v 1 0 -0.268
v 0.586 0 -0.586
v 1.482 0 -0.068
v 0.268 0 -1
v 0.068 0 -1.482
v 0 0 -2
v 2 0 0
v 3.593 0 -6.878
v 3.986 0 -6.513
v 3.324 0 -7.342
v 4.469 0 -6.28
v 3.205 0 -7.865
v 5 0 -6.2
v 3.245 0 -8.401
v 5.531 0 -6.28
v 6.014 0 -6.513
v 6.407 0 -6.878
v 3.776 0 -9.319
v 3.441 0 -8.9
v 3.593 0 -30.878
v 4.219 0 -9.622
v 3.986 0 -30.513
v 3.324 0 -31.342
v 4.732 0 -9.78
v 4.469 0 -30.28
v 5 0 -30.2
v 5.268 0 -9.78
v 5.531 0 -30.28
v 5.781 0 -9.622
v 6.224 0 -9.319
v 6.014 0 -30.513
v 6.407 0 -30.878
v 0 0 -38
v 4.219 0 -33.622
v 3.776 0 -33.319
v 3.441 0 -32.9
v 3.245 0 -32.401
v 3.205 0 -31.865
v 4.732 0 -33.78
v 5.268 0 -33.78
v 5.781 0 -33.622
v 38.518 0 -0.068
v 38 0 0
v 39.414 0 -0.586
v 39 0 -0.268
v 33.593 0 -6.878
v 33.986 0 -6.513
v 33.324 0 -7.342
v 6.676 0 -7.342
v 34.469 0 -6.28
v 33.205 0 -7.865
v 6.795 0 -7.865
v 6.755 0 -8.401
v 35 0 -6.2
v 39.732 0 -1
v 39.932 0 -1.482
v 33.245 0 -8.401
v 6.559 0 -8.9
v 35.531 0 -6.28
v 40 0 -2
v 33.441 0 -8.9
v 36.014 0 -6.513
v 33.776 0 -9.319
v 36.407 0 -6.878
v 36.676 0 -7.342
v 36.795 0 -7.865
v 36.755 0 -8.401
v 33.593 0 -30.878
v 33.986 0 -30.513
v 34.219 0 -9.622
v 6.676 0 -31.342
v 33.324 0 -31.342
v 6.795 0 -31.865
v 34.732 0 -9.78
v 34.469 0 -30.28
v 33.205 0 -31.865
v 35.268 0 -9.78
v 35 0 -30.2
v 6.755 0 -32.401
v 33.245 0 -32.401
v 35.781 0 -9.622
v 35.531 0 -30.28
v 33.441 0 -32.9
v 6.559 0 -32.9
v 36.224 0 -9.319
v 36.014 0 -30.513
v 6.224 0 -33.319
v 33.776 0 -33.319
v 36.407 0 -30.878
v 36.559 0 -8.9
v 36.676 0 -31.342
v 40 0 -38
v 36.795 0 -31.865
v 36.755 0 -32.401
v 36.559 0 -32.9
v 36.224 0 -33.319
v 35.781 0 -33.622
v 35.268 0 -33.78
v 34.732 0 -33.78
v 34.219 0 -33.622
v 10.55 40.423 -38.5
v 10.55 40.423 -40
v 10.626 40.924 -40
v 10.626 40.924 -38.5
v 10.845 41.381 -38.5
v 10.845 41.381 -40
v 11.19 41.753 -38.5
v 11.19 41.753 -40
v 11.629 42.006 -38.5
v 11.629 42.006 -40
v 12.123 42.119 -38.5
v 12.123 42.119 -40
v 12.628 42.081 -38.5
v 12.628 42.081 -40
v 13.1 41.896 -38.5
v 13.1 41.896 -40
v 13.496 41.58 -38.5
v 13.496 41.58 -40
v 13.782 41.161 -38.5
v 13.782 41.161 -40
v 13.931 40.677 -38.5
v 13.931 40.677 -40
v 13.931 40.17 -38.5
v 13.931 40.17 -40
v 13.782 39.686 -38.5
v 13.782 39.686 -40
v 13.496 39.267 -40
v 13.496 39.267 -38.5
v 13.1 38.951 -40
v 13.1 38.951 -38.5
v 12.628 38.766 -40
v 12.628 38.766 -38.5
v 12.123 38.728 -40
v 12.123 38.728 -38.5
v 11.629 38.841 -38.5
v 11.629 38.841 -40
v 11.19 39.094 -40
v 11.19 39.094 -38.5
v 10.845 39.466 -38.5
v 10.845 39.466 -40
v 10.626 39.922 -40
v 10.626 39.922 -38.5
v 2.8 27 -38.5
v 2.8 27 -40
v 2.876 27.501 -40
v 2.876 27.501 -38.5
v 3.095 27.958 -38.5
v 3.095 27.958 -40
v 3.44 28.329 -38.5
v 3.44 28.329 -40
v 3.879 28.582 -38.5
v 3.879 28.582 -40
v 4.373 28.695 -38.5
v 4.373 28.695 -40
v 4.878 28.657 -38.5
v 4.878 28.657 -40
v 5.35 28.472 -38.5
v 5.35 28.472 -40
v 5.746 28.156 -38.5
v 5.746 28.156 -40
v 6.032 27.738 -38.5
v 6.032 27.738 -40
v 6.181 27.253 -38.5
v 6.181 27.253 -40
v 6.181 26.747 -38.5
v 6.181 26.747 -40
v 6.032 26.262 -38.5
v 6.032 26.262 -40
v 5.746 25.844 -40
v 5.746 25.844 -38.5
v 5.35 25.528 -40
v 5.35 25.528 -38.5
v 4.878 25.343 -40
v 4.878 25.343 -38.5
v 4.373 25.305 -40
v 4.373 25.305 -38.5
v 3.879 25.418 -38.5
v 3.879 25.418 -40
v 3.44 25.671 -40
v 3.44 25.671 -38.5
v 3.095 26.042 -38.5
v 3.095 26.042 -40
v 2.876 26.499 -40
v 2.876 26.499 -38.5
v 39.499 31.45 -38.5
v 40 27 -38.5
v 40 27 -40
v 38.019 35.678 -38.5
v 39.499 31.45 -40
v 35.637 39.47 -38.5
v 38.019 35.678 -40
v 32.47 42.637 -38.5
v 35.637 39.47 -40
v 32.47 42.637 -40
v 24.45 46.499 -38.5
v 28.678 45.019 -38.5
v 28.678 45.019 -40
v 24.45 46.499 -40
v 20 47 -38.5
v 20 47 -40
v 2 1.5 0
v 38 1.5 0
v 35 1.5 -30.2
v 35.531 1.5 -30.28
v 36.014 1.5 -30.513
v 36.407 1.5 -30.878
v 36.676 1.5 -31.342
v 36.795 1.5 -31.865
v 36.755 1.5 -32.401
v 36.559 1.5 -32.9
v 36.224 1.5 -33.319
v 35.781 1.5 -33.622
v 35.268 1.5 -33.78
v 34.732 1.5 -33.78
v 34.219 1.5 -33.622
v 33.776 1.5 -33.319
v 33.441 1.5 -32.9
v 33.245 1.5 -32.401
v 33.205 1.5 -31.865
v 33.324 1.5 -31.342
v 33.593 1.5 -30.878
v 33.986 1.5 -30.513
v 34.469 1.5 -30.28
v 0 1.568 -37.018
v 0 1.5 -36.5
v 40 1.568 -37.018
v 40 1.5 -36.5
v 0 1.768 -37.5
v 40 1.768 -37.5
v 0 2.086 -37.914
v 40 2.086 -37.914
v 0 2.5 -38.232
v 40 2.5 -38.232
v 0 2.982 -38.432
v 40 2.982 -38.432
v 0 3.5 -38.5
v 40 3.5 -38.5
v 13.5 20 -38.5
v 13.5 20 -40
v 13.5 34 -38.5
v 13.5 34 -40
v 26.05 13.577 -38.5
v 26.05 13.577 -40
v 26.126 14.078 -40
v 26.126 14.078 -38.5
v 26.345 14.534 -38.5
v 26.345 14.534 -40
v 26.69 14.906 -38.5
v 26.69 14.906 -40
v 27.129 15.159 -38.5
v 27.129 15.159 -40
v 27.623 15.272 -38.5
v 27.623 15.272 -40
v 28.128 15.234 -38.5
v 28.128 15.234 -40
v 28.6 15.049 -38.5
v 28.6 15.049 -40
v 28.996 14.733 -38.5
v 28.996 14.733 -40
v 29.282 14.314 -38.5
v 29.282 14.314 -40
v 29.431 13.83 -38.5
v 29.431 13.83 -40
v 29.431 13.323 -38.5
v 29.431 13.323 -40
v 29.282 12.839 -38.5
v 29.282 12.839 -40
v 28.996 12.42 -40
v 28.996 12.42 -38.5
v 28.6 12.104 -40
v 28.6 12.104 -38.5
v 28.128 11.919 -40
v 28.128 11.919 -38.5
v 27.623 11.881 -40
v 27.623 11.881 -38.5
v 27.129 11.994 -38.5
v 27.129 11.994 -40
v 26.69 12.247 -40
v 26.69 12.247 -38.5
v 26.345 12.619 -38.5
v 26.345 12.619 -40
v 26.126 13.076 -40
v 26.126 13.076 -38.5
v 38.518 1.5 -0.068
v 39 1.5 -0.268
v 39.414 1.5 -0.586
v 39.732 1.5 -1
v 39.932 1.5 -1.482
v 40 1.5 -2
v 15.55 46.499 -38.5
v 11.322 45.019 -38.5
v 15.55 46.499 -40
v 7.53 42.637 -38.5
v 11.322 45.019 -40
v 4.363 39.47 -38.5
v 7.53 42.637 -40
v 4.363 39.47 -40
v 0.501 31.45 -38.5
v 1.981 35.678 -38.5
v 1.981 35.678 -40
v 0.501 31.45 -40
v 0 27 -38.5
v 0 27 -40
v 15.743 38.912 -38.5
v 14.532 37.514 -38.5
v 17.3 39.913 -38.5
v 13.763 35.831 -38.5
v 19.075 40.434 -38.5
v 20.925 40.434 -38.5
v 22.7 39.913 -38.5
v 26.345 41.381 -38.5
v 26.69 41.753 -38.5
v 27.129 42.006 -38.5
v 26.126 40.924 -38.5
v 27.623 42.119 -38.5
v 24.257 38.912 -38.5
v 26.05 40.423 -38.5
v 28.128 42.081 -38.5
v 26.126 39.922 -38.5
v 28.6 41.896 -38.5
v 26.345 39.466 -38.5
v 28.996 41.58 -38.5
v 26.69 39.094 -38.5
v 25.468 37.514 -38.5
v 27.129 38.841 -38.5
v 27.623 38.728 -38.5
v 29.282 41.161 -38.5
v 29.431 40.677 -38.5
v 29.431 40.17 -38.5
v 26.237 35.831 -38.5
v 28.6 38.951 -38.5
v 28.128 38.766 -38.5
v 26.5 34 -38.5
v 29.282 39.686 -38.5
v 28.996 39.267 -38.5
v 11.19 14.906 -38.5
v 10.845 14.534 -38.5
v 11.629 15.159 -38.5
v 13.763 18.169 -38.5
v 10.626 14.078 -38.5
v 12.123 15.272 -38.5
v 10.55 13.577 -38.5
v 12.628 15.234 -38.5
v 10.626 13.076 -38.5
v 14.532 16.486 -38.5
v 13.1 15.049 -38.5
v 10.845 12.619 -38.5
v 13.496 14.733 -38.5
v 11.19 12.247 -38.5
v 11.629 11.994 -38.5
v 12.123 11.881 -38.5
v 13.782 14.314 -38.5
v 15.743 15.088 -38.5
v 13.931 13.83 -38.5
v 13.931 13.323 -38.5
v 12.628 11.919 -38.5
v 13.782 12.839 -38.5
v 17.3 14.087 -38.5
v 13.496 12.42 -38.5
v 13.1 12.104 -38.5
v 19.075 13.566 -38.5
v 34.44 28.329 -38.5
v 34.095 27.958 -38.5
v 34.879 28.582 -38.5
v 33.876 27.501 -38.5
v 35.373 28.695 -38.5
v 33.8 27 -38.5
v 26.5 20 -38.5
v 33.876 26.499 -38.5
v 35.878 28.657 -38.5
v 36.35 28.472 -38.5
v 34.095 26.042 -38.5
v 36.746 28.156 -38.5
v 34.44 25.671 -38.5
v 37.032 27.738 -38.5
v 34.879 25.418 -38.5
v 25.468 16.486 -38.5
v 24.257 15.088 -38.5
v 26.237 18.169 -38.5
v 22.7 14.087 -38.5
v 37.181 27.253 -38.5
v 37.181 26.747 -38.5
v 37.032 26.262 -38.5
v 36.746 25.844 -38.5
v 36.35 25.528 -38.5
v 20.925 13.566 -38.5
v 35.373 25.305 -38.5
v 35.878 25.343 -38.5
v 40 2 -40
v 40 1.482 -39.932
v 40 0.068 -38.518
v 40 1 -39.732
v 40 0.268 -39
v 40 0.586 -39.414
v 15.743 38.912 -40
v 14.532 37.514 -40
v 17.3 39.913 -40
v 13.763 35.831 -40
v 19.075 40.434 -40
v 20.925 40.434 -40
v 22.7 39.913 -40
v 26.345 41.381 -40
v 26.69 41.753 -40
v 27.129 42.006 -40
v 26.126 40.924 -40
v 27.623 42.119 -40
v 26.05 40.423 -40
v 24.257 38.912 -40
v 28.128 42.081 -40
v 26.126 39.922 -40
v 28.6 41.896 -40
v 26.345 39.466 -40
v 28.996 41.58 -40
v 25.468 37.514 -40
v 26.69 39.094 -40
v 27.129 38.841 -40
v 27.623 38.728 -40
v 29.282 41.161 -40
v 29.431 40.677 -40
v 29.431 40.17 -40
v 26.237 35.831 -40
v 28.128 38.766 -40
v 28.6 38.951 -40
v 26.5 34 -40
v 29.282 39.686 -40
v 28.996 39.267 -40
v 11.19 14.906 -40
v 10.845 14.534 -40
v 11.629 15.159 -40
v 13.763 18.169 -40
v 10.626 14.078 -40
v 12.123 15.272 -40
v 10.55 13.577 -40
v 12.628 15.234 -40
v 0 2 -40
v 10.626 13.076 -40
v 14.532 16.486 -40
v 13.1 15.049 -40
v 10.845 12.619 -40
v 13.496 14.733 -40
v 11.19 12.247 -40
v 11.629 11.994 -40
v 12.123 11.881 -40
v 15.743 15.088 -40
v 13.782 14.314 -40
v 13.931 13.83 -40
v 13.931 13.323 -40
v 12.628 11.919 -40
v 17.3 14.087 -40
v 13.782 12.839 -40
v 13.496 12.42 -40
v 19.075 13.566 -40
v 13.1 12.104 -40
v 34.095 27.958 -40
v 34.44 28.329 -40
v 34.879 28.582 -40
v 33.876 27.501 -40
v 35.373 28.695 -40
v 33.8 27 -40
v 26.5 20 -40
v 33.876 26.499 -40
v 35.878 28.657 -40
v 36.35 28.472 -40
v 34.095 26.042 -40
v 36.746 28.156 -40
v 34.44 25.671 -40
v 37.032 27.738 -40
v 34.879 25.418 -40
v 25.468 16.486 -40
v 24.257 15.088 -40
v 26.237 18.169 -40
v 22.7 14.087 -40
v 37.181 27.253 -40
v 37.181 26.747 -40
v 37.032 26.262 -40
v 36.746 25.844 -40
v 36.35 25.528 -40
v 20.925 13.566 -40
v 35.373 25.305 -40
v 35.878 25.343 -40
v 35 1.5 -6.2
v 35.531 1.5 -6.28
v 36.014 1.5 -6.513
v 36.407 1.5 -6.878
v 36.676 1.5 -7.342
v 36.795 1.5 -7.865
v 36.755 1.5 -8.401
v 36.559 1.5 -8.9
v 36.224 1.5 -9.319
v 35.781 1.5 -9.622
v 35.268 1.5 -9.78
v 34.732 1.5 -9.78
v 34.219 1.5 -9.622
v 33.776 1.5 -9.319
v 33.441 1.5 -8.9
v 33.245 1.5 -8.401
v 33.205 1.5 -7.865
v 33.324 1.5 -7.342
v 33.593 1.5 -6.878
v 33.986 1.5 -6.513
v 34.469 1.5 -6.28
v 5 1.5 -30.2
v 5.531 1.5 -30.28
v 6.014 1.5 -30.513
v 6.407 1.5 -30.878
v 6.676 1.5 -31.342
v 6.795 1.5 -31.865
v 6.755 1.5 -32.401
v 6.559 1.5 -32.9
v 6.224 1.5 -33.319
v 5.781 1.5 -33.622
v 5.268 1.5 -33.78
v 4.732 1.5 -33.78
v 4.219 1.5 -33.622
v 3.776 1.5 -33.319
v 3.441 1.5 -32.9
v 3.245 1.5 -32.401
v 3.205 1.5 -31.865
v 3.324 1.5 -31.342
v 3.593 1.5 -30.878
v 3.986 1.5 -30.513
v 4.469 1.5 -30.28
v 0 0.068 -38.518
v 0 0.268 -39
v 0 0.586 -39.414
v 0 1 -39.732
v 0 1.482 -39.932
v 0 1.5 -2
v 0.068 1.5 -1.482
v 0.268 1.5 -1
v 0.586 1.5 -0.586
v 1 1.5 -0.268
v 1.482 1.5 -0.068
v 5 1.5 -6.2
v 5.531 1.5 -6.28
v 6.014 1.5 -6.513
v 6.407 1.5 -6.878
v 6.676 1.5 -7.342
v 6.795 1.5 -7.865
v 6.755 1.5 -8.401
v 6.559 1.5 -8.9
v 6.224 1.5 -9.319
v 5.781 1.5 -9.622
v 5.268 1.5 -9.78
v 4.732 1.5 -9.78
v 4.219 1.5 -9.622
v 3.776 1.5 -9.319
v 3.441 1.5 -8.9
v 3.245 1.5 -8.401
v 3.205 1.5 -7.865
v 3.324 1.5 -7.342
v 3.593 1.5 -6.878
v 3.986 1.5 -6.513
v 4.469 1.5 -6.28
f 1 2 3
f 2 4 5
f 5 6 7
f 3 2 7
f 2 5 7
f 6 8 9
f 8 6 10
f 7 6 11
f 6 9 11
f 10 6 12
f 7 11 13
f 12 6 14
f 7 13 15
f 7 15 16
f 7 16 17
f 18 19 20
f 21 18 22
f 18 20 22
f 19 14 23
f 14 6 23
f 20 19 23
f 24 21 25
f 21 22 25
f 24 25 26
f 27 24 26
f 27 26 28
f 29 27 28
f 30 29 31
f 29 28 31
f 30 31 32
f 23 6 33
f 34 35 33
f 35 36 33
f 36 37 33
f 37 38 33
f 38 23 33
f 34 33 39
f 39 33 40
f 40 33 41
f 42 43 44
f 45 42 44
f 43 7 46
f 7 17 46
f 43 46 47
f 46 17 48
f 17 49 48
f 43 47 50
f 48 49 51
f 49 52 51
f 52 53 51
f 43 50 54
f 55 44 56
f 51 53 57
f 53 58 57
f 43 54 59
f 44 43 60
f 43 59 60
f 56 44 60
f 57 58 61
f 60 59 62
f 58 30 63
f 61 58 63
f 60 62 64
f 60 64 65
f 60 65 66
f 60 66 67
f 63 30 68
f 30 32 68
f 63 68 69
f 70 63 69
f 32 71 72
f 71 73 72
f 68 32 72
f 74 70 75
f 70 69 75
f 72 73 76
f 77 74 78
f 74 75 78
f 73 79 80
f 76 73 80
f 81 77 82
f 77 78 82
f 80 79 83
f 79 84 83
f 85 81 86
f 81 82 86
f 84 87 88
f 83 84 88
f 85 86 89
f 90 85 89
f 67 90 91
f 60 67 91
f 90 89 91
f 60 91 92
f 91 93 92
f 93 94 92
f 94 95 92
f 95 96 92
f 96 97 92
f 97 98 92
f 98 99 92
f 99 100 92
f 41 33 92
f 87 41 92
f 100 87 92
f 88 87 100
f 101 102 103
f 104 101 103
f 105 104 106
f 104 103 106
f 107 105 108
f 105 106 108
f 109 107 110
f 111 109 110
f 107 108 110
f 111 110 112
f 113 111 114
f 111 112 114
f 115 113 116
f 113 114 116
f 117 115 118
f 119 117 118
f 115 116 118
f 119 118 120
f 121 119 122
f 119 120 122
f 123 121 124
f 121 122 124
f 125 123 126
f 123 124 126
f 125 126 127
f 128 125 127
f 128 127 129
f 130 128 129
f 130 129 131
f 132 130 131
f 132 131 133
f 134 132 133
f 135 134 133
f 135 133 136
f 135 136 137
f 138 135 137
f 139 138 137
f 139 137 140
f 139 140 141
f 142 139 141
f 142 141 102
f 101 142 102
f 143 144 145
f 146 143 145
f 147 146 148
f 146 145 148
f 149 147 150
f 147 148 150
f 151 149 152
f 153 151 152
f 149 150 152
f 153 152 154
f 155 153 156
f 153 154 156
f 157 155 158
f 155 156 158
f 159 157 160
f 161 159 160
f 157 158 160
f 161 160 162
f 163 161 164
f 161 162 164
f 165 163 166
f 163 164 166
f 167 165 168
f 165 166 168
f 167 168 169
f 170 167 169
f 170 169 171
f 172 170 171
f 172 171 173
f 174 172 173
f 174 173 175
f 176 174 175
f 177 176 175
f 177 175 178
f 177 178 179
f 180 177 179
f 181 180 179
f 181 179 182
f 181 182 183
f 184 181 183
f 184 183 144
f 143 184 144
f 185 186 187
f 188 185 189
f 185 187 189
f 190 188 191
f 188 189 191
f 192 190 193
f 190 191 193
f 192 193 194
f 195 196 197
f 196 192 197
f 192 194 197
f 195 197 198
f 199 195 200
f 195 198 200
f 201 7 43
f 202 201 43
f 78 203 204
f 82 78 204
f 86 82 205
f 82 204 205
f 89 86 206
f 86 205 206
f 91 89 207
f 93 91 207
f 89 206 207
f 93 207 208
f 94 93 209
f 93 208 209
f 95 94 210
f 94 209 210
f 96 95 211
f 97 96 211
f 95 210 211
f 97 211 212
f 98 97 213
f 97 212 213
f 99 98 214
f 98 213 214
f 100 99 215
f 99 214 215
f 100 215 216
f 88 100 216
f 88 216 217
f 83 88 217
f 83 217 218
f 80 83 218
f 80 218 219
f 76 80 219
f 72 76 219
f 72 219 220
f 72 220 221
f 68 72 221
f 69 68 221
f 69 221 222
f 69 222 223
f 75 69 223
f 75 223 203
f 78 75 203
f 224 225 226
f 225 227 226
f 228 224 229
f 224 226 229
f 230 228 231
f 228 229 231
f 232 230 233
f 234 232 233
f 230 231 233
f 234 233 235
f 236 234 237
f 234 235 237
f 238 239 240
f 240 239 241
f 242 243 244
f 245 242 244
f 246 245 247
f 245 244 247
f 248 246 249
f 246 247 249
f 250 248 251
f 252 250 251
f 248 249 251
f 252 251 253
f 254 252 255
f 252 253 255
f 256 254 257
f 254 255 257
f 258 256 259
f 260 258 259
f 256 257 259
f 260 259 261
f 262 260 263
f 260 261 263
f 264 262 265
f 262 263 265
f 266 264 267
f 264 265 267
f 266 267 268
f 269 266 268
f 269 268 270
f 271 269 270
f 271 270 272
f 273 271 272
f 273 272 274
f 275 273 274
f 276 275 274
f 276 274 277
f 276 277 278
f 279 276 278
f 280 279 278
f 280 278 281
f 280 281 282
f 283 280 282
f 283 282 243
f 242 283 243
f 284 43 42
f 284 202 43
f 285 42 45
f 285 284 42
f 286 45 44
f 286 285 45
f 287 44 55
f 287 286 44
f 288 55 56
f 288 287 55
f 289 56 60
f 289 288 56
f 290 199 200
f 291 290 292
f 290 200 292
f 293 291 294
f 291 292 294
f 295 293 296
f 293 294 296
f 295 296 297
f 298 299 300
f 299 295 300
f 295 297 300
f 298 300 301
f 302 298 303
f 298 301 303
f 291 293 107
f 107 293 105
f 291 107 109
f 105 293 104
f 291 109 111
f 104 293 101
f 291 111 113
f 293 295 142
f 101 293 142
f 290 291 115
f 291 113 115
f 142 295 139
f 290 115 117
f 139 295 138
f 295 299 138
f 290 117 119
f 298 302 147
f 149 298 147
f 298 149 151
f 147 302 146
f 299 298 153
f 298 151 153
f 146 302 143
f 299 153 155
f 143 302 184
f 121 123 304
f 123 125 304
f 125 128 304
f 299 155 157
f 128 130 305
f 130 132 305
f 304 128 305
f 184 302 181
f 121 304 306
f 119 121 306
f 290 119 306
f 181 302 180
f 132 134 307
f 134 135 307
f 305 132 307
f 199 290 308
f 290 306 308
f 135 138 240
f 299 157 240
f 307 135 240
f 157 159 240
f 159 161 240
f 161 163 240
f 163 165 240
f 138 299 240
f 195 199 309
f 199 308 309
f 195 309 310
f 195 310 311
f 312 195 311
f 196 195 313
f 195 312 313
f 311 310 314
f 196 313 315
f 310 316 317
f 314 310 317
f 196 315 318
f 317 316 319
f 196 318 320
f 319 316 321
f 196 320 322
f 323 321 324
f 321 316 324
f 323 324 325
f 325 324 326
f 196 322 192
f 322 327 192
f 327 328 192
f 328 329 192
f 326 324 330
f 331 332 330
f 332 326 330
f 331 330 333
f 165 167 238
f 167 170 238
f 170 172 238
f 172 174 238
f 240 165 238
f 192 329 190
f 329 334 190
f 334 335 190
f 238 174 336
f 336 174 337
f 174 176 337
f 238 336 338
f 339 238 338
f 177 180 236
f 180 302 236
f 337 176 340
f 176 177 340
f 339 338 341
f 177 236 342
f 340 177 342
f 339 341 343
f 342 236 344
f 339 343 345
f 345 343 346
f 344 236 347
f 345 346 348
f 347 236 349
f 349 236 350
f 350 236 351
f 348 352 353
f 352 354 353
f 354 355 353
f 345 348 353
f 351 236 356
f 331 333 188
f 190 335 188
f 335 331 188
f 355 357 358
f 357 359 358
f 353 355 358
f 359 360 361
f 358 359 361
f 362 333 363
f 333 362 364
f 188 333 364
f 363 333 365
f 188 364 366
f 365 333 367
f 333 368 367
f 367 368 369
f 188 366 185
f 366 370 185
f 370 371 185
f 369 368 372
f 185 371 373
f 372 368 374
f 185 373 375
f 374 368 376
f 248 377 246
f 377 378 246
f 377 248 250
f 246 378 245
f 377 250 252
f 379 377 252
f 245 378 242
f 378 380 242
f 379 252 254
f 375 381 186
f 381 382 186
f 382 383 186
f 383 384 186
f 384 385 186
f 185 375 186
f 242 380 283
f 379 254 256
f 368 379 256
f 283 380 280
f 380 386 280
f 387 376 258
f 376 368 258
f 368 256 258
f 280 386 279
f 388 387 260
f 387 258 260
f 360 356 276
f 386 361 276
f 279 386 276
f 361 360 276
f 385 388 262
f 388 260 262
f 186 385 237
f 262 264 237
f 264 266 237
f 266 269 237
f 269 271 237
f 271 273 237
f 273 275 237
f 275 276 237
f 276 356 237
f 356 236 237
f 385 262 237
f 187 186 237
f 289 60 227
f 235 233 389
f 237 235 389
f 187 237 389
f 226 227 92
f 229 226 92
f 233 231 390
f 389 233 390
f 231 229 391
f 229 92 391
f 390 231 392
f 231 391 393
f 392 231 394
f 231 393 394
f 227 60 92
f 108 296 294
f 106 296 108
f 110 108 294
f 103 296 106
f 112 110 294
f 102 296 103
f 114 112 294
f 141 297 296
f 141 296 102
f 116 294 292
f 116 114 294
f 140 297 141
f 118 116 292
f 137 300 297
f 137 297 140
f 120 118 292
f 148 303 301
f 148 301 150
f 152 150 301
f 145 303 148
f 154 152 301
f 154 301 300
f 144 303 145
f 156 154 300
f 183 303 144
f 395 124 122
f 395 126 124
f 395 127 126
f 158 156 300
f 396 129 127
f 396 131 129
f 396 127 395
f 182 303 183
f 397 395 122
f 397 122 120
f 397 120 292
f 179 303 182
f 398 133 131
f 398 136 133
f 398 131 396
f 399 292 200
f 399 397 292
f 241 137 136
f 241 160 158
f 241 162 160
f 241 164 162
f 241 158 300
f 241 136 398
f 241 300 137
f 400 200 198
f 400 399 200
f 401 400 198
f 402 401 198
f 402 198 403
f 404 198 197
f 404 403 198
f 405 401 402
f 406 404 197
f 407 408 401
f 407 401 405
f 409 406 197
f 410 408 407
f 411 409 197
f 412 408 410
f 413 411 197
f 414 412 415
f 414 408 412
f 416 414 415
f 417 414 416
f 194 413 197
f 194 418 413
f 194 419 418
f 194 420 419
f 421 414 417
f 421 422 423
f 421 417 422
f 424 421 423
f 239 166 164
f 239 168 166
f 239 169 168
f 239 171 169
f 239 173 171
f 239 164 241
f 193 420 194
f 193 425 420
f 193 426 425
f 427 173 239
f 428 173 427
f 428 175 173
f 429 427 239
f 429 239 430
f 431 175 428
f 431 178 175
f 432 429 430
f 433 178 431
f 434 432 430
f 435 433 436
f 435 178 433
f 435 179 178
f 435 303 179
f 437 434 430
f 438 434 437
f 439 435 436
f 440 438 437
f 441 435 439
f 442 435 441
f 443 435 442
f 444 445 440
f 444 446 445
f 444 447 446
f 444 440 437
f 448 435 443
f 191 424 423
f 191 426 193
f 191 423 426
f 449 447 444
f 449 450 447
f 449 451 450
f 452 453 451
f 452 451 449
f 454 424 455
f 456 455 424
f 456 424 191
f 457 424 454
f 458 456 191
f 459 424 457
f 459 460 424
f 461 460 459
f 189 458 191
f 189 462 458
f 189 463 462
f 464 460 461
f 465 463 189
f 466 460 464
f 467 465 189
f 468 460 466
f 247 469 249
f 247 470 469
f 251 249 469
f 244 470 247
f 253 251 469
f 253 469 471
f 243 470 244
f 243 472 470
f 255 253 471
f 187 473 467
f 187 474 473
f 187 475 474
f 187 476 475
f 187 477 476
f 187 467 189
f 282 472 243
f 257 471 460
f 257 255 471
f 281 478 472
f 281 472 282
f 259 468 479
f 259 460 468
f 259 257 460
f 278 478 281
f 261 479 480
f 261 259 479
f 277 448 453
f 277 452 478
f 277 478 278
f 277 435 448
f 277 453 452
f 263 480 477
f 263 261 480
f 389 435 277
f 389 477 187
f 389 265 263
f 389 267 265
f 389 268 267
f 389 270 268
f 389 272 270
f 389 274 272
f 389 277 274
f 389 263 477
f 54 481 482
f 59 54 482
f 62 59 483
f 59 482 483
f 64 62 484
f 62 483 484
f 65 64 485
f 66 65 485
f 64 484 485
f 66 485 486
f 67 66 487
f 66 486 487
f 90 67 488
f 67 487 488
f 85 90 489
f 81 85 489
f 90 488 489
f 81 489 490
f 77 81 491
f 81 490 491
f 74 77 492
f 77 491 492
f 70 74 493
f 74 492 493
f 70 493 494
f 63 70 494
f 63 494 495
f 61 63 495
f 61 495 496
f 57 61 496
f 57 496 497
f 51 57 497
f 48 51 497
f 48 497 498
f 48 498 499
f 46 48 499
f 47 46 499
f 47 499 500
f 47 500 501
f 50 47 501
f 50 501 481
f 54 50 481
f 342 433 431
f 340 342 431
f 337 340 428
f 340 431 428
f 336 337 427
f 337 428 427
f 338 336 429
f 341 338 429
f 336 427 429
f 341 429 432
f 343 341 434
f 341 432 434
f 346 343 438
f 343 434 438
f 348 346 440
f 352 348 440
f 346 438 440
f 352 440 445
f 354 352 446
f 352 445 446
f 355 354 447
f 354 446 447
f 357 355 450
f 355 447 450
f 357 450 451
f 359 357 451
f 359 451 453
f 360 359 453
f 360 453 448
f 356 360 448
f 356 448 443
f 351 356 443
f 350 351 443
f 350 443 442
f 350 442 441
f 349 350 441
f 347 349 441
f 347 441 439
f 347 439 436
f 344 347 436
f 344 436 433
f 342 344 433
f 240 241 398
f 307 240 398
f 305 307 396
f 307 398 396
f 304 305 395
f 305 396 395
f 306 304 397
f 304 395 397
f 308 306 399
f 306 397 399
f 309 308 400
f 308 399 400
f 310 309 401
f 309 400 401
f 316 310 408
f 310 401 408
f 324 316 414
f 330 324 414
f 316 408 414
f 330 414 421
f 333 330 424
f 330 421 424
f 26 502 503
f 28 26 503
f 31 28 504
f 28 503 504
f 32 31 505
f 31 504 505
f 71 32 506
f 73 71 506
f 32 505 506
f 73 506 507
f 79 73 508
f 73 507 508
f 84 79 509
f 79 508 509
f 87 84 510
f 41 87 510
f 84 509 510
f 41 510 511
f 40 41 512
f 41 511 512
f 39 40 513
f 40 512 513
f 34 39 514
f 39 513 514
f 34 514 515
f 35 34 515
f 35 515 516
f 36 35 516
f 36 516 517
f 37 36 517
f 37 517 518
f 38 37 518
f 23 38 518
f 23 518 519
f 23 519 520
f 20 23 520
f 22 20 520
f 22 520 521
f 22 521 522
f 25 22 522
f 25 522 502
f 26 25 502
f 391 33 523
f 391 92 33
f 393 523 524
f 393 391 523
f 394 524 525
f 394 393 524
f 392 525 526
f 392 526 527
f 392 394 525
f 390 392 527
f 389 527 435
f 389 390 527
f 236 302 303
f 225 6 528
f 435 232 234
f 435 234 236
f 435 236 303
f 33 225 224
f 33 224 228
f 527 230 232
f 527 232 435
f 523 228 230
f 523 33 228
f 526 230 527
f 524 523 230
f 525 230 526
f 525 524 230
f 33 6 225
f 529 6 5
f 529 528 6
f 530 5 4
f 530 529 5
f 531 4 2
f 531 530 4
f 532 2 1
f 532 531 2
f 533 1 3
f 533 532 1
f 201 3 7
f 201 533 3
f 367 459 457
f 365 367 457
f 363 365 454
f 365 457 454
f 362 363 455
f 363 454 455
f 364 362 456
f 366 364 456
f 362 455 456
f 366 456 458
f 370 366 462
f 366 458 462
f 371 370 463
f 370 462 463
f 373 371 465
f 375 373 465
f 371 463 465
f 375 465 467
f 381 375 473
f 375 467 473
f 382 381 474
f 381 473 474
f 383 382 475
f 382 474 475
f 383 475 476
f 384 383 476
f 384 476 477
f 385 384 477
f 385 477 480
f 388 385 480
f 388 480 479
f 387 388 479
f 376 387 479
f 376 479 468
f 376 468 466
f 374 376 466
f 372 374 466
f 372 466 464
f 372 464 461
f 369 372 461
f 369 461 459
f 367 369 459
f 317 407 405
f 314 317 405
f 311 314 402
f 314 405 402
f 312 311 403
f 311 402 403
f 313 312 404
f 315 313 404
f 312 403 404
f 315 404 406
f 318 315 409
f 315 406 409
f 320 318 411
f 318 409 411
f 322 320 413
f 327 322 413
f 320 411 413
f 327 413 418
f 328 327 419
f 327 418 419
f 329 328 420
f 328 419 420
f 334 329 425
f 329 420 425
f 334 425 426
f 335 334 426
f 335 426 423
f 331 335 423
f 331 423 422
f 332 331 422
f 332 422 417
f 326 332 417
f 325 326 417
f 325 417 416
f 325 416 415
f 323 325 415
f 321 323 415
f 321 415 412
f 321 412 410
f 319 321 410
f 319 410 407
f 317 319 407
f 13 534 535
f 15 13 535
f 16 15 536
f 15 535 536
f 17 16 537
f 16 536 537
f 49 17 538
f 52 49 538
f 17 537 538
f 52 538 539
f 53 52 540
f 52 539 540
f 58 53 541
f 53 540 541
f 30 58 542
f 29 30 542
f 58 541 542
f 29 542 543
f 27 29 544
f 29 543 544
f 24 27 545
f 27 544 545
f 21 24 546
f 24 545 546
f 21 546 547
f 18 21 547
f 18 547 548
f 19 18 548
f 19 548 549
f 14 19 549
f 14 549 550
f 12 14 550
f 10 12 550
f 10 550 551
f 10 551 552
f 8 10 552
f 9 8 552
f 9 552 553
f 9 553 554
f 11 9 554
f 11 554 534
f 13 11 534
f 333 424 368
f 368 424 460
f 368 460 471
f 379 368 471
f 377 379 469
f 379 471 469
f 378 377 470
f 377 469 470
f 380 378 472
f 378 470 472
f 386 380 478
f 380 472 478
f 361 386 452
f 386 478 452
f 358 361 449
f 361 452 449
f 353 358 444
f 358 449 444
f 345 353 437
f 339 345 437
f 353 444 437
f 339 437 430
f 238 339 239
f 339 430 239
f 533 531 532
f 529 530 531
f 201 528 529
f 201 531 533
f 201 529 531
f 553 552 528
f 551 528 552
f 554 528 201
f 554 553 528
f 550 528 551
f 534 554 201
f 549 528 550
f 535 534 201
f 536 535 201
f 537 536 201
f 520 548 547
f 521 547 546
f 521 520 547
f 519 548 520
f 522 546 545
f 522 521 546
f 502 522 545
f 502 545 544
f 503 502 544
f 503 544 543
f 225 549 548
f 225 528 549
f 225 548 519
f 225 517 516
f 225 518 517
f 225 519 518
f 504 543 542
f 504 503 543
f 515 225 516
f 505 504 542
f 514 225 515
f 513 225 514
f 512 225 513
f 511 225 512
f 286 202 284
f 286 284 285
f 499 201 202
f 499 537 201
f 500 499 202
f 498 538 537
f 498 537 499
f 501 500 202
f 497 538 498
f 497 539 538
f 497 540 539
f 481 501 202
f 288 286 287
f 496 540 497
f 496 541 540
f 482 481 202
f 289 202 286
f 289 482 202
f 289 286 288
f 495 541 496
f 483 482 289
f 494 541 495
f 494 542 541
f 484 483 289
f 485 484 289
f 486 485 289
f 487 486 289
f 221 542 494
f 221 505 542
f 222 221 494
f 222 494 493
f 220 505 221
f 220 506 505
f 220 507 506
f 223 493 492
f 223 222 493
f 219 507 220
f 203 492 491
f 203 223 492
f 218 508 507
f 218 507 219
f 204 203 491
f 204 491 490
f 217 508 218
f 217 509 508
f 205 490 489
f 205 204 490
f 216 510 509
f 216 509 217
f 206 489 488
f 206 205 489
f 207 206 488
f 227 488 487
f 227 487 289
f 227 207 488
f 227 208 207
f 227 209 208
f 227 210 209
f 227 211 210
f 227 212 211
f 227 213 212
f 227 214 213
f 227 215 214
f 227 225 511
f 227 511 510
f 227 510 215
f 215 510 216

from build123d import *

# Parameters (mm, degrees)
SKETCH1_W           = 40
SKETCH1_H           = 40
BOSS_EXTRUDE1_DEPTH = 1.5
SKETCH2_W           = 40
SKETCH2_H           = 1.5
BOSS_EXTRUDE2_DEPTH = 45.5
CUT_EXTRUDE2_REACH  = 75.546
CUT_EXTRUDE3_REACH  = 75.546
SKETCH4_R           = 1.7
CUT_EXTRUDE4_REACH  = 74.596
SKETCH5_R           = 1.8
FILLET1_R           = 2


with BuildPart() as part:
    # Sketch1 → Boss-Extrude1 (new body)
    with BuildSketch(Plane(origin=(0, 0, 0), x_dir=(1, 0, 0), z_dir=(0, 1, 0))):
        with Locations((20, 20)):
            Rectangle(SKETCH1_W, SKETCH1_H)
    extrude(amount=BOSS_EXTRUDE1_DEPTH)

    # Sketch2 → Boss-Extrude2 (add)
    with BuildSketch(Plane(origin=(0, 1.5, 0), x_dir=(1, 0, 0), z_dir=(0, 1, 0))):
        with Locations((20, 39.25)):
            Rectangle(SKETCH2_W, SKETCH2_H)
    extrude(amount=BOSS_EXTRUDE2_DEPTH)

    # Sketch3 → Cut-Extrude2 (cut, up to next)
    with BuildSketch(Plane(origin=(0, 0, -40), x_dir=(-1, 0, 0), z_dir=(0, 0, -1)), mode=Mode.PRIVATE) as cut_extrude2_sk1:
        with BuildLine():
            Line((-13.5, 20), (-13.5, 34))
            ThreePointArc((-13.5, 34), (-20, 40.5), (-26.5, 34))
            Line((-26.5, 34), (-26.5, 20))
            ThreePointArc((-26.5, 20), (-20, 13.5), (-13.5, 20))
        make_face()
    cut_extrude2_tool1 = extrude(cut_extrude2_sk1.sketch, amount=-CUT_EXTRUDE2_REACH, mode=Mode.PRIVATE) & part.part
    # Sketch3 → Cut-Extrude2 (cut, up to next)
    with BuildSketch(Plane(origin=(0, 0, -40), x_dir=(-1, 0, 0), z_dir=(0, 0, -1)), mode=Mode.PRIVATE) as cut_extrude2_sk2:
        with BuildLine():
            Line((-20, 47), (-40, 47))
            Line((-40, 47), (-40, 27))
            ThreePointArc((-40, 27), (-34.142135624, 41.142135624), (-20, 47))
        make_face()
    cut_extrude2_tool2 = extrude(cut_extrude2_sk2.sketch, amount=-CUT_EXTRUDE2_REACH, mode=Mode.PRIVATE) & part.part
    # Sketch3 → Cut-Extrude2 (cut, up to next)
    with BuildSketch(Plane(origin=(0, 0, -40), x_dir=(-1, 0, 0), z_dir=(0, 0, -1)), mode=Mode.PRIVATE) as cut_extrude2_sk3:
        with BuildLine():
            Line((0, 47), (-20, 47))
            ThreePointArc((-20, 47), (-5.857864376, 41.142135624), (0, 27))
            Line((0, 27), (0, 47))
        make_face()
    cut_extrude2_tool3 = extrude(cut_extrude2_sk3.sketch, amount=-CUT_EXTRUDE2_REACH, mode=Mode.PRIVATE) & part.part
    add(cut_extrude2_tool1.solids().sort_by_distance((20, 27, -40))[0], mode=Mode.SUBTRACT)
    add(cut_extrude2_tool2.solids().sort_by_distance((35.532641, 42.532641, -40))[0], mode=Mode.SUBTRACT)
    add(cut_extrude2_tool3.solids().sort_by_distance((4.467359, 42.532641, -40))[0], mode=Mode.SUBTRACT)

    # Sketch4 → Cut-Extrude3 (cut, up to next)
    with BuildSketch(Plane(origin=(0, 0, -40), x_dir=(-1, 0, 0), z_dir=(0, 0, -1)), mode=Mode.PRIVATE) as cut_extrude3_sk1:
        with Locations((-35.5, 27)):
            Circle(SKETCH4_R)
    cut_extrude3_tool1 = extrude(cut_extrude3_sk1.sketch, amount=-CUT_EXTRUDE3_REACH, mode=Mode.PRIVATE) & part.part
    # Sketch4 → Cut-Extrude3 (cut, up to next)
    with BuildSketch(Plane(origin=(0, 0, -40), x_dir=(-1, 0, 0), z_dir=(0, 0, -1)), mode=Mode.PRIVATE) as cut_extrude3_sk2:
        with Locations((-27.75, 40.423393759)):
            Circle(SKETCH4_R)
    cut_extrude3_tool2 = extrude(cut_extrude3_sk2.sketch, amount=-CUT_EXTRUDE3_REACH, mode=Mode.PRIVATE) & part.part
    # Sketch4 → Cut-Extrude3 (cut, up to next)
    with BuildSketch(Plane(origin=(0, 0, -40), x_dir=(-1, 0, 0), z_dir=(0, 0, -1)), mode=Mode.PRIVATE) as cut_extrude3_sk3:
        with Locations((-12.25, 40.423393759)):
            Circle(SKETCH4_R)
    cut_extrude3_tool3 = extrude(cut_extrude3_sk3.sketch, amount=-CUT_EXTRUDE3_REACH, mode=Mode.PRIVATE) & part.part
    # Sketch4 → Cut-Extrude3 (cut, up to next)
    with BuildSketch(Plane(origin=(0, 0, -40), x_dir=(-1, 0, 0), z_dir=(0, 0, -1)), mode=Mode.PRIVATE) as cut_extrude3_sk4:
        with Locations((-4.5, 27)):
            Circle(SKETCH4_R)
    cut_extrude3_tool4 = extrude(cut_extrude3_sk4.sketch, amount=-CUT_EXTRUDE3_REACH, mode=Mode.PRIVATE) & part.part
    # Sketch4 → Cut-Extrude3 (cut, up to next)
    with BuildSketch(Plane(origin=(0, 0, -40), x_dir=(-1, 0, 0), z_dir=(0, 0, -1)), mode=Mode.PRIVATE) as cut_extrude3_sk5:
        with Locations((-12.25, 13.576606241)):
            Circle(SKETCH4_R)
    cut_extrude3_tool5 = extrude(cut_extrude3_sk5.sketch, amount=-CUT_EXTRUDE3_REACH, mode=Mode.PRIVATE) & part.part
    # Sketch4 → Cut-Extrude3 (cut, up to next)
    with BuildSketch(Plane(origin=(0, 0, -40), x_dir=(-1, 0, 0), z_dir=(0, 0, -1)), mode=Mode.PRIVATE) as cut_extrude3_sk6:
        with Locations((-27.75, 13.576606241)):
            Circle(SKETCH4_R)
    cut_extrude3_tool6 = extrude(cut_extrude3_sk6.sketch, amount=-CUT_EXTRUDE3_REACH, mode=Mode.PRIVATE) & part.part
    add(cut_extrude3_tool1.solids().sort_by_distance((35.5, 27, -40))[0], mode=Mode.SUBTRACT)
    add(cut_extrude3_tool2.solids().sort_by_distance((27.75, 40.423394, -40))[0], mode=Mode.SUBTRACT)
    add(cut_extrude3_tool3.solids().sort_by_distance((12.25, 40.423394, -40))[0], mode=Mode.SUBTRACT)
    add(cut_extrude3_tool4.solids().sort_by_distance((4.5, 27, -40))[0], mode=Mode.SUBTRACT)
    add(cut_extrude3_tool5.solids().sort_by_distance((12.25, 13.576606, -40))[0], mode=Mode.SUBTRACT)
    add(cut_extrude3_tool6.solids().sort_by_distance((27.75, 13.576606, -40))[0], mode=Mode.SUBTRACT)

    # Sketch5 → Cut-Extrude4 (cut, up to next)
    with BuildSketch(Plane(origin=(0, 1.5, 0), x_dir=(1, 0, 0), z_dir=(0, 1, 0)), mode=Mode.PRIVATE) as cut_extrude4_sk1:
        with Locations(Location((5, 32, 0), (0, 0, 270))):
            Circle(SKETCH5_R)
    cut_extrude4_tool1 = extrude(cut_extrude4_sk1.sketch, amount=-CUT_EXTRUDE4_REACH, mode=Mode.PRIVATE) & part.part
    # Sketch5 → Cut-Extrude4 (cut, up to next)
    with BuildSketch(Plane(origin=(0, 1.5, 0), x_dir=(1, 0, 0), z_dir=(0, 1, 0)), mode=Mode.PRIVATE) as cut_extrude4_sk2:
        with Locations(Location((35, 32, 0), (0, 0, 270))):
            Circle(SKETCH5_R)
    cut_extrude4_tool2 = extrude(cut_extrude4_sk2.sketch, amount=-CUT_EXTRUDE4_REACH, mode=Mode.PRIVATE) & part.part
    # Sketch5 → Cut-Extrude4 (cut, up to next)
    with BuildSketch(Plane(origin=(0, 1.5, 0), x_dir=(1, 0, 0), z_dir=(0, 1, 0)), mode=Mode.PRIVATE) as cut_extrude4_sk3:
        with Locations(Location((35, 8, 0), (0, 0, 270))):
            Circle(SKETCH5_R)
    cut_extrude4_tool3 = extrude(cut_extrude4_sk3.sketch, amount=-CUT_EXTRUDE4_REACH, mode=Mode.PRIVATE) & part.part
    # Sketch5 → Cut-Extrude4 (cut, up to next)
    with BuildSketch(Plane(origin=(0, 1.5, 0), x_dir=(1, 0, 0), z_dir=(0, 1, 0)), mode=Mode.PRIVATE) as cut_extrude4_sk4:
        with Locations(Location((5, 8, 0), (0, 0, 270))):
            Circle(SKETCH5_R)
    cut_extrude4_tool4 = extrude(cut_extrude4_sk4.sketch, amount=-CUT_EXTRUDE4_REACH, mode=Mode.PRIVATE) & part.part
    add(cut_extrude4_tool1.solids().sort_by_distance((5, 1.5, -32))[0], mode=Mode.SUBTRACT)
    add(cut_extrude4_tool2.solids().sort_by_distance((35, 1.5, -32))[0], mode=Mode.SUBTRACT)
    add(cut_extrude4_tool3.solids().sort_by_distance((35, 1.5, -8))[0], mode=Mode.SUBTRACT)
    add(cut_extrude4_tool4.solids().sort_by_distance((5, 1.5, -8))[0], mode=Mode.SUBTRACT)

    # Fillet1
    fillet1_edges = [part.edges().sort_by_distance(p)[0] for p in [
        (20, 1.5, -38.5),
        (20, 0, -40),
        (40, 0.75, 0),
        (0, 0.75, 0),
    ]]
    fillet(fillet1_edges, radius=FILLET1_R)


solid = part.part
